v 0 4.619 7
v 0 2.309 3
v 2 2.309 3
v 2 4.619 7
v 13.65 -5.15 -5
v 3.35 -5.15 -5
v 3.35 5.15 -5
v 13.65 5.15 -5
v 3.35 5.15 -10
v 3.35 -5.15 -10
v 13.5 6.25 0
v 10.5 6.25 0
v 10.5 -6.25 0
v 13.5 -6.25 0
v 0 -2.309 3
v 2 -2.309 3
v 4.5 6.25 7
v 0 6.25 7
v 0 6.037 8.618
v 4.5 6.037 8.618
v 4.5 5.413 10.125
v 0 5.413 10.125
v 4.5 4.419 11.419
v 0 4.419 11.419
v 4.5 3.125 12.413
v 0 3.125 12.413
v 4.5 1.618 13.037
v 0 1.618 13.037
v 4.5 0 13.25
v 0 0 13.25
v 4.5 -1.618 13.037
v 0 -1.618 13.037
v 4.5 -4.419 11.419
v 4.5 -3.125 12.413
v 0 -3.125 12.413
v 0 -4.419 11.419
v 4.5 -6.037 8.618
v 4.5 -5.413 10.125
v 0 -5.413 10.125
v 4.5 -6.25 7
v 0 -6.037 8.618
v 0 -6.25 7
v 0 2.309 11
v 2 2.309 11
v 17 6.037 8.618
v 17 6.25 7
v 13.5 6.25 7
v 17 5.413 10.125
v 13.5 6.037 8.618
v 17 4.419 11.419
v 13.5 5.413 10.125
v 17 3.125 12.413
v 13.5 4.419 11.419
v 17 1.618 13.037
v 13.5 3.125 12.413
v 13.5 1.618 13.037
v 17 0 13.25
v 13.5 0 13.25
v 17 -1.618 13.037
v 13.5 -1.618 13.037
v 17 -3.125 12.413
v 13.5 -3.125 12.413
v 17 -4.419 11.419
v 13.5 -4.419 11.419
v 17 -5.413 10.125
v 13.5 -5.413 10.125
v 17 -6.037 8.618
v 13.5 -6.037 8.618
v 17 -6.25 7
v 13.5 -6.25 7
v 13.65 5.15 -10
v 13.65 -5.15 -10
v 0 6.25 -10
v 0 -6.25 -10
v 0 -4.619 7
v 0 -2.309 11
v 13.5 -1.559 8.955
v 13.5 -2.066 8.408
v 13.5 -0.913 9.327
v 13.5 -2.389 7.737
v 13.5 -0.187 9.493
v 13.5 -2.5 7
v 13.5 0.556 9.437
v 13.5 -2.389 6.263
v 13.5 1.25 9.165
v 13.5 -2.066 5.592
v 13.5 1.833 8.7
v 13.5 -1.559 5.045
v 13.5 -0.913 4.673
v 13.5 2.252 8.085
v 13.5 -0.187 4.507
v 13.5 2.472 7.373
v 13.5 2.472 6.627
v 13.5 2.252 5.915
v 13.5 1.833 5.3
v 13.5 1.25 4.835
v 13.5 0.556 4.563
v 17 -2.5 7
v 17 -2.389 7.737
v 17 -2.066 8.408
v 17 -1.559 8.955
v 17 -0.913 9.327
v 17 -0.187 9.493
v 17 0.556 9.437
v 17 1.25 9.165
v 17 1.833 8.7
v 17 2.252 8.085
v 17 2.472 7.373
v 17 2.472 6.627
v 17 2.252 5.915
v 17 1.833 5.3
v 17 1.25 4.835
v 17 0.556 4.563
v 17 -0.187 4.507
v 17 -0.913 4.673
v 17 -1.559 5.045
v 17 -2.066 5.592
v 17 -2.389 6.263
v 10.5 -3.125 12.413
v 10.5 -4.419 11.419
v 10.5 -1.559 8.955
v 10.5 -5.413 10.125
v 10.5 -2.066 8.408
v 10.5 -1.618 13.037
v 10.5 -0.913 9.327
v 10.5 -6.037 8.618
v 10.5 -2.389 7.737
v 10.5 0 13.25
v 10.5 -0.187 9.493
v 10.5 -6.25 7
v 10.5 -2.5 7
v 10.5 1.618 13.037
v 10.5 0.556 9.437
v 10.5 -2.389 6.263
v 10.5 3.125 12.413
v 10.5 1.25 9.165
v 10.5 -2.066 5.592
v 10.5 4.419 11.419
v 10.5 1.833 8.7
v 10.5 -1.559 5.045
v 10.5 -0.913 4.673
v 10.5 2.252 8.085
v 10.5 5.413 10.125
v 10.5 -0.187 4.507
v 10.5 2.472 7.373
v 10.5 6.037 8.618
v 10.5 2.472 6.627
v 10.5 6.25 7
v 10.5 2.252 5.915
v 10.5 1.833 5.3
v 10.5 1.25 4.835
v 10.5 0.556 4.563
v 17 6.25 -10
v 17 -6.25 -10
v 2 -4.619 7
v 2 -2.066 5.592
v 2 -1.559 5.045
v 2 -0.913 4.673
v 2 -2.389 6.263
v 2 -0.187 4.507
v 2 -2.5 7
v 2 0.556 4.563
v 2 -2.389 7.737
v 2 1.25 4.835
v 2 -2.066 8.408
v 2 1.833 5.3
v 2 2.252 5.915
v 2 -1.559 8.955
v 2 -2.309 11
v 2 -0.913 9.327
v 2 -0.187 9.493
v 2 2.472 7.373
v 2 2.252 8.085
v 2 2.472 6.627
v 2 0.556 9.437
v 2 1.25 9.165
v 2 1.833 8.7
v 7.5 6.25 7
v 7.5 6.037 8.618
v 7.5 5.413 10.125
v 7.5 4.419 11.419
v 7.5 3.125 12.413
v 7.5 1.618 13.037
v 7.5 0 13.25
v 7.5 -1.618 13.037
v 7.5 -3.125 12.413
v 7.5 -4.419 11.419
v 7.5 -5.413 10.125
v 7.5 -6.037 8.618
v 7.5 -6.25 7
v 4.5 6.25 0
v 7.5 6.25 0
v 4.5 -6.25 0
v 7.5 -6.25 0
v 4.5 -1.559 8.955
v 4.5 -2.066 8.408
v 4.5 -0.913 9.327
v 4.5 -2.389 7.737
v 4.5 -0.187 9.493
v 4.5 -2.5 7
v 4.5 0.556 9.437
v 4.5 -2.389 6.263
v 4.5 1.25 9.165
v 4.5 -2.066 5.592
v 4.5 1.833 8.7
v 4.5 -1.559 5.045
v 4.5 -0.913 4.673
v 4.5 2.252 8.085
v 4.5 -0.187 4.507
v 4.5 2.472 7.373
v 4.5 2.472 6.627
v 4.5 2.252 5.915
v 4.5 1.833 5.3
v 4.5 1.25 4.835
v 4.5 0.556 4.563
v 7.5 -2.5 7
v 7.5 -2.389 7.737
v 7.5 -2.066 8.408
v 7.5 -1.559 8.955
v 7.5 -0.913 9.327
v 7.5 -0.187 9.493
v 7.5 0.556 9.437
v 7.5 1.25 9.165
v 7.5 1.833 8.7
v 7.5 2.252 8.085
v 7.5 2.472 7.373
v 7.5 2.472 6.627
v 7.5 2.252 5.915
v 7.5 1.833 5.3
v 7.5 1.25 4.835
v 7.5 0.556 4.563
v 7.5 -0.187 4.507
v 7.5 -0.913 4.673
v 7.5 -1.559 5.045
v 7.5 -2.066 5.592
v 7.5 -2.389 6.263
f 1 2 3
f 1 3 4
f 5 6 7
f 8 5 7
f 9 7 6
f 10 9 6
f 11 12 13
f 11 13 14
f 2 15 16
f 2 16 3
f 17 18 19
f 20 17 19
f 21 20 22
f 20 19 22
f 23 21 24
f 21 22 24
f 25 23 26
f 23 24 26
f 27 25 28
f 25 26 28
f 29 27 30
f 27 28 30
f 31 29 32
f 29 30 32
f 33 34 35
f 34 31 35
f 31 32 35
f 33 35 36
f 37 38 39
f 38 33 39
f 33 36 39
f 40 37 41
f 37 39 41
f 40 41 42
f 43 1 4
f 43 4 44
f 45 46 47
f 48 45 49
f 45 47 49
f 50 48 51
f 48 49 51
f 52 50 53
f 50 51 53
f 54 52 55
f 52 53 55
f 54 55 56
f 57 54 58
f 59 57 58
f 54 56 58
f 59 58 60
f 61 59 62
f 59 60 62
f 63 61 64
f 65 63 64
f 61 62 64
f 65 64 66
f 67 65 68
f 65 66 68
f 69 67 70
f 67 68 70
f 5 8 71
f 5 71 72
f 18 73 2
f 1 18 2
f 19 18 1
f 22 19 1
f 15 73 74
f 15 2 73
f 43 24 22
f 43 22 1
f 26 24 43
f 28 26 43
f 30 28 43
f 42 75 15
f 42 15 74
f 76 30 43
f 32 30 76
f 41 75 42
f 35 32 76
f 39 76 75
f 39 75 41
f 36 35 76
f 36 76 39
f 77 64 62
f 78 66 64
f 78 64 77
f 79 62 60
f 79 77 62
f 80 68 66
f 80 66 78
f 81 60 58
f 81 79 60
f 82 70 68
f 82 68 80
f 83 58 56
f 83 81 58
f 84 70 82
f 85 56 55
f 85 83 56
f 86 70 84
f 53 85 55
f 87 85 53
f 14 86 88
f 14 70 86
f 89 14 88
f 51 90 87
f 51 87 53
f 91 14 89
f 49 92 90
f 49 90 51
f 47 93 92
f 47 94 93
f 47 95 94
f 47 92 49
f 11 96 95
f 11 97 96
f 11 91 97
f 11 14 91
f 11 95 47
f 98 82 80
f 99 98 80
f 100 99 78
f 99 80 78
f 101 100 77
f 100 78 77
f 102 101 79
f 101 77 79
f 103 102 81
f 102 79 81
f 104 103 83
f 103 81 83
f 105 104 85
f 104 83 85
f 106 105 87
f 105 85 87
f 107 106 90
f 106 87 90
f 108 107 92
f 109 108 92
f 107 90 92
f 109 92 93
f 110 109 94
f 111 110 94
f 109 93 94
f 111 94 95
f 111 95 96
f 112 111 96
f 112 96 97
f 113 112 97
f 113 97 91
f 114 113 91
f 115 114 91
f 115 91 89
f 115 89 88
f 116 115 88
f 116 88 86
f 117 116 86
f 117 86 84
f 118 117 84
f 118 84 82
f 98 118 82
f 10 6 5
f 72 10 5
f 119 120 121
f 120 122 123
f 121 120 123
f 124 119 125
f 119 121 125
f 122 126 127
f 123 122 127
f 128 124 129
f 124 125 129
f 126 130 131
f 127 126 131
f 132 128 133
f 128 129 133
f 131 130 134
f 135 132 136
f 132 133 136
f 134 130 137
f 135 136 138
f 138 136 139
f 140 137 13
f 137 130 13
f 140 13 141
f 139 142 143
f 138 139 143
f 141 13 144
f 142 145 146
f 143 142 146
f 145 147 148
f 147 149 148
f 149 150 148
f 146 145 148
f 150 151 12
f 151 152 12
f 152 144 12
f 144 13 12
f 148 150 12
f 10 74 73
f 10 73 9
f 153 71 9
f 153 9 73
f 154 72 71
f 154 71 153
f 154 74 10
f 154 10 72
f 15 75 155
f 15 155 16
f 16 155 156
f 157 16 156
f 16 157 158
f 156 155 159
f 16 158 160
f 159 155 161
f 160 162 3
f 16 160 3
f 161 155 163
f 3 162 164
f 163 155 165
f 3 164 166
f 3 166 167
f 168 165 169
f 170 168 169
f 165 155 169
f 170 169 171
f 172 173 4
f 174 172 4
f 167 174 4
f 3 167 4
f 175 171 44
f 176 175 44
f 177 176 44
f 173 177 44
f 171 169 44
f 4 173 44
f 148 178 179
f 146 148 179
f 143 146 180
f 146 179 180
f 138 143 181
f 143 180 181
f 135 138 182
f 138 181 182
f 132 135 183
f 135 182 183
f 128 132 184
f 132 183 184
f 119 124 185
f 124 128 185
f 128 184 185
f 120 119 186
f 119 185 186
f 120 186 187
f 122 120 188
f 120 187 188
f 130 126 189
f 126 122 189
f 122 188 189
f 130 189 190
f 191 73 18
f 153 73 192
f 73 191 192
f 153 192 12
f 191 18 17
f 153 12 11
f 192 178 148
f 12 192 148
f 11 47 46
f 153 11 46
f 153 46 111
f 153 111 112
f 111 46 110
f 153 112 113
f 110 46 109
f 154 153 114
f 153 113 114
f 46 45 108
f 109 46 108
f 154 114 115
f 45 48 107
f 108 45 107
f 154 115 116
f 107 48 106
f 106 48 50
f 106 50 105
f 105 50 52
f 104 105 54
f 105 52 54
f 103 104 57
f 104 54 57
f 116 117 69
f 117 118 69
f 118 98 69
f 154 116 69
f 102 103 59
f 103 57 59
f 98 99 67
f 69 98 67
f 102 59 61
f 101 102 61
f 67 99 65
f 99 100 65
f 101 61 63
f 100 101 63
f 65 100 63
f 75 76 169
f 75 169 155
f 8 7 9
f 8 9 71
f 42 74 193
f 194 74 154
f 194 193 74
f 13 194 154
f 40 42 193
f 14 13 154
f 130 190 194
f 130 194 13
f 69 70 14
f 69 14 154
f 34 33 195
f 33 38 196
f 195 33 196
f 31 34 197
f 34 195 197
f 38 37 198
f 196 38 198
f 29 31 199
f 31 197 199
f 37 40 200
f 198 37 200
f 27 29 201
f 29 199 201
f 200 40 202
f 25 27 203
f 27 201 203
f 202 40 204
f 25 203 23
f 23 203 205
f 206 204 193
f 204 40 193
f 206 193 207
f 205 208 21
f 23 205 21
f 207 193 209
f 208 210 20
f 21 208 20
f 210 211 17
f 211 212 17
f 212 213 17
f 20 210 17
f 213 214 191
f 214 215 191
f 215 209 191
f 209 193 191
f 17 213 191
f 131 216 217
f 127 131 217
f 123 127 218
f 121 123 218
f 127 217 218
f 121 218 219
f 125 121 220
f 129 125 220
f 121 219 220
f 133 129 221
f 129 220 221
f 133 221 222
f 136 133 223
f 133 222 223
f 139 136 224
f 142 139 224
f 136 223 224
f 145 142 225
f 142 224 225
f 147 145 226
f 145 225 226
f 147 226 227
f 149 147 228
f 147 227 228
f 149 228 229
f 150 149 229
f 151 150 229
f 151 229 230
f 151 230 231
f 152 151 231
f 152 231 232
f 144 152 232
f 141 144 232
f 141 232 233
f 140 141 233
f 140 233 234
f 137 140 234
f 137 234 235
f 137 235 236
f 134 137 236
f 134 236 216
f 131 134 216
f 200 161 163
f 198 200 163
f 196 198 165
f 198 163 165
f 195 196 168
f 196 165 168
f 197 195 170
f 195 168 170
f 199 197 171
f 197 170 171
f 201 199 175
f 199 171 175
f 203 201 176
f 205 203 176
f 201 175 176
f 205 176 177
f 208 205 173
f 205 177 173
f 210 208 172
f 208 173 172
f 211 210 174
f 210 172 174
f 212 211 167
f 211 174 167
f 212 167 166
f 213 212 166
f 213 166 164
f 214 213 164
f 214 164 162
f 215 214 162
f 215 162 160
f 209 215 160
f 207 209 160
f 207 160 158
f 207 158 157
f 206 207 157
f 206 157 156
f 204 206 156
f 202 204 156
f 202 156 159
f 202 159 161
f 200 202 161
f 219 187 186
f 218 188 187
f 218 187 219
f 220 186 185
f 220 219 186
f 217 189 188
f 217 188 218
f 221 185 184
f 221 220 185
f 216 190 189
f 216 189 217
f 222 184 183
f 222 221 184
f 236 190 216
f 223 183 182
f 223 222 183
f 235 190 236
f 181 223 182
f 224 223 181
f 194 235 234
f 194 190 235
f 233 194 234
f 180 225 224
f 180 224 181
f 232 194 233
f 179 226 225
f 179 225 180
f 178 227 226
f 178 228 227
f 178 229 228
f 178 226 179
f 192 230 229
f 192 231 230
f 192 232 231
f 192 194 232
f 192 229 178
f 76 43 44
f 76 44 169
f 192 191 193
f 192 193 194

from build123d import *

# Parameters (mm, degrees)
F0_W     = 12.5
F0_H     = 5
F1_DEPTH = 17
F2_DEPTH = 2
F3_W     = 3
F3_H     = 20.822813987
F3_H_2   = 20
F4_DEPTH = 25
F5_W     = 17
F5_H     = 12.5
F5_W_2   = 10.3
F5_H_2   = 10.3
F6_DEPTH = 5


with BuildPart() as f1:
    # F0 (on Right) → F1 (new body)
    with BuildSketch(Plane.YZ):
        with BuildLine():
            ThreePointArc((6.25, 7), (0, 13.25), (-6.25, 7))
            Line((-6.25, 7), (-4.6188021535, 7))
            Line((-4.6188021535, 7), (-2.3094010768, 11))
            Line((-2.3094010768, 11), (2.3094010768, 11))
            Line((2.3094010768, 11), (4.6188021535, 7))
            Line((4.6188021535, 7), (6.25, 7))
        make_face()
        Polygon((-6.25, 7), (-6.25, 0), (6.25, 0), (6.25, 7), (4.6188021535, 7), (2.3094010768, 3), (-2.3094010768, 3), (-4.6188021535, 7), align=None)
        with BuildLine():
            Line((-2.5, 7), (-4.6188021535, 7))
            Line((-4.6188021535, 7), (-2.3094010768, 3))
            Line((-2.3094010768, 3), (2.3094010768, 3))
            Line((2.3094010768, 3), (4.6188021535, 7))
            Line((4.6188021535, 7), (2.5, 7))
            ThreePointArc((2.5, 7), (0, 4.5), (-2.5, 7))
        make_face()
        with BuildLine():
            Line((-2.3094010768, 11), (-4.6188021535, 7))
            Line((-4.6188021535, 7), (-2.5, 7))
            ThreePointArc((-2.5, 7), (0, 9.5), (2.5, 7))
            Line((2.5, 7), (4.6188021535, 7))
            Line((4.6188021535, 7), (2.3094010768, 11))
            Line((2.3094010768, 11), (-2.3094010768, 11))
        make_face()
        with Locations((0, -2.5)):
            Rectangle(F0_W, F0_H)
    extrude(amount=F1_DEPTH)

    # F0 (on Right) → F2 (cut)
    with BuildSketch(Plane.YZ):
        with BuildLine():
            Line((-2.3094010768, 11), (-4.6188021535, 7))
            Line((-4.6188021535, 7), (-2.5, 7))
            ThreePointArc((-2.5, 7), (0, 9.5), (2.5, 7))
            Line((2.5, 7), (4.6188021535, 7))
            Line((4.6188021535, 7), (2.3094010768, 11))
            Line((2.3094010768, 11), (-2.3094010768, 11))
        make_face()
        with BuildLine():
            Line((-2.5, 7), (-4.6188021535, 7))
            Line((-4.6188021535, 7), (-2.3094010768, 3))
            Line((-2.3094010768, 3), (2.3094010768, 3))
            Line((2.3094010768, 3), (4.6188021535, 7))
            Line((4.6188021535, 7), (2.5, 7))
            ThreePointArc((2.5, 7), (0, 4.5), (-2.5, 7))
        make_face()
    extrude(amount=F2_DEPTH, mode=Mode.SUBTRACT)

    # F3 (on Top) → F4 (cut)
    with BuildSketch(Plane.XY):
        with Locations((6, -0.3987241719)):
            Rectangle(F3_W, F3_H)
        with Locations((12, -1.1113596391)):
            Rectangle(F3_W, F3_H_2)
    extrude(amount=F4_DEPTH, mode=Mode.SUBTRACT)

    # F5 (on face) → F6 (join)
    with BuildSketch(Plane(origin=(0, 0, -5), x_dir=(1, 0, 0), z_dir=(0, 0, -1))):
        with Locations((8.5, 0)):
            Rectangle(F5_W, F5_H)
        with Locations((8.5, 0)):
            Rectangle(F5_W_2, F5_H_2, mode=Mode.SUBTRACT)
    extrude(amount=F6_DEPTH)


solid = f1.part
